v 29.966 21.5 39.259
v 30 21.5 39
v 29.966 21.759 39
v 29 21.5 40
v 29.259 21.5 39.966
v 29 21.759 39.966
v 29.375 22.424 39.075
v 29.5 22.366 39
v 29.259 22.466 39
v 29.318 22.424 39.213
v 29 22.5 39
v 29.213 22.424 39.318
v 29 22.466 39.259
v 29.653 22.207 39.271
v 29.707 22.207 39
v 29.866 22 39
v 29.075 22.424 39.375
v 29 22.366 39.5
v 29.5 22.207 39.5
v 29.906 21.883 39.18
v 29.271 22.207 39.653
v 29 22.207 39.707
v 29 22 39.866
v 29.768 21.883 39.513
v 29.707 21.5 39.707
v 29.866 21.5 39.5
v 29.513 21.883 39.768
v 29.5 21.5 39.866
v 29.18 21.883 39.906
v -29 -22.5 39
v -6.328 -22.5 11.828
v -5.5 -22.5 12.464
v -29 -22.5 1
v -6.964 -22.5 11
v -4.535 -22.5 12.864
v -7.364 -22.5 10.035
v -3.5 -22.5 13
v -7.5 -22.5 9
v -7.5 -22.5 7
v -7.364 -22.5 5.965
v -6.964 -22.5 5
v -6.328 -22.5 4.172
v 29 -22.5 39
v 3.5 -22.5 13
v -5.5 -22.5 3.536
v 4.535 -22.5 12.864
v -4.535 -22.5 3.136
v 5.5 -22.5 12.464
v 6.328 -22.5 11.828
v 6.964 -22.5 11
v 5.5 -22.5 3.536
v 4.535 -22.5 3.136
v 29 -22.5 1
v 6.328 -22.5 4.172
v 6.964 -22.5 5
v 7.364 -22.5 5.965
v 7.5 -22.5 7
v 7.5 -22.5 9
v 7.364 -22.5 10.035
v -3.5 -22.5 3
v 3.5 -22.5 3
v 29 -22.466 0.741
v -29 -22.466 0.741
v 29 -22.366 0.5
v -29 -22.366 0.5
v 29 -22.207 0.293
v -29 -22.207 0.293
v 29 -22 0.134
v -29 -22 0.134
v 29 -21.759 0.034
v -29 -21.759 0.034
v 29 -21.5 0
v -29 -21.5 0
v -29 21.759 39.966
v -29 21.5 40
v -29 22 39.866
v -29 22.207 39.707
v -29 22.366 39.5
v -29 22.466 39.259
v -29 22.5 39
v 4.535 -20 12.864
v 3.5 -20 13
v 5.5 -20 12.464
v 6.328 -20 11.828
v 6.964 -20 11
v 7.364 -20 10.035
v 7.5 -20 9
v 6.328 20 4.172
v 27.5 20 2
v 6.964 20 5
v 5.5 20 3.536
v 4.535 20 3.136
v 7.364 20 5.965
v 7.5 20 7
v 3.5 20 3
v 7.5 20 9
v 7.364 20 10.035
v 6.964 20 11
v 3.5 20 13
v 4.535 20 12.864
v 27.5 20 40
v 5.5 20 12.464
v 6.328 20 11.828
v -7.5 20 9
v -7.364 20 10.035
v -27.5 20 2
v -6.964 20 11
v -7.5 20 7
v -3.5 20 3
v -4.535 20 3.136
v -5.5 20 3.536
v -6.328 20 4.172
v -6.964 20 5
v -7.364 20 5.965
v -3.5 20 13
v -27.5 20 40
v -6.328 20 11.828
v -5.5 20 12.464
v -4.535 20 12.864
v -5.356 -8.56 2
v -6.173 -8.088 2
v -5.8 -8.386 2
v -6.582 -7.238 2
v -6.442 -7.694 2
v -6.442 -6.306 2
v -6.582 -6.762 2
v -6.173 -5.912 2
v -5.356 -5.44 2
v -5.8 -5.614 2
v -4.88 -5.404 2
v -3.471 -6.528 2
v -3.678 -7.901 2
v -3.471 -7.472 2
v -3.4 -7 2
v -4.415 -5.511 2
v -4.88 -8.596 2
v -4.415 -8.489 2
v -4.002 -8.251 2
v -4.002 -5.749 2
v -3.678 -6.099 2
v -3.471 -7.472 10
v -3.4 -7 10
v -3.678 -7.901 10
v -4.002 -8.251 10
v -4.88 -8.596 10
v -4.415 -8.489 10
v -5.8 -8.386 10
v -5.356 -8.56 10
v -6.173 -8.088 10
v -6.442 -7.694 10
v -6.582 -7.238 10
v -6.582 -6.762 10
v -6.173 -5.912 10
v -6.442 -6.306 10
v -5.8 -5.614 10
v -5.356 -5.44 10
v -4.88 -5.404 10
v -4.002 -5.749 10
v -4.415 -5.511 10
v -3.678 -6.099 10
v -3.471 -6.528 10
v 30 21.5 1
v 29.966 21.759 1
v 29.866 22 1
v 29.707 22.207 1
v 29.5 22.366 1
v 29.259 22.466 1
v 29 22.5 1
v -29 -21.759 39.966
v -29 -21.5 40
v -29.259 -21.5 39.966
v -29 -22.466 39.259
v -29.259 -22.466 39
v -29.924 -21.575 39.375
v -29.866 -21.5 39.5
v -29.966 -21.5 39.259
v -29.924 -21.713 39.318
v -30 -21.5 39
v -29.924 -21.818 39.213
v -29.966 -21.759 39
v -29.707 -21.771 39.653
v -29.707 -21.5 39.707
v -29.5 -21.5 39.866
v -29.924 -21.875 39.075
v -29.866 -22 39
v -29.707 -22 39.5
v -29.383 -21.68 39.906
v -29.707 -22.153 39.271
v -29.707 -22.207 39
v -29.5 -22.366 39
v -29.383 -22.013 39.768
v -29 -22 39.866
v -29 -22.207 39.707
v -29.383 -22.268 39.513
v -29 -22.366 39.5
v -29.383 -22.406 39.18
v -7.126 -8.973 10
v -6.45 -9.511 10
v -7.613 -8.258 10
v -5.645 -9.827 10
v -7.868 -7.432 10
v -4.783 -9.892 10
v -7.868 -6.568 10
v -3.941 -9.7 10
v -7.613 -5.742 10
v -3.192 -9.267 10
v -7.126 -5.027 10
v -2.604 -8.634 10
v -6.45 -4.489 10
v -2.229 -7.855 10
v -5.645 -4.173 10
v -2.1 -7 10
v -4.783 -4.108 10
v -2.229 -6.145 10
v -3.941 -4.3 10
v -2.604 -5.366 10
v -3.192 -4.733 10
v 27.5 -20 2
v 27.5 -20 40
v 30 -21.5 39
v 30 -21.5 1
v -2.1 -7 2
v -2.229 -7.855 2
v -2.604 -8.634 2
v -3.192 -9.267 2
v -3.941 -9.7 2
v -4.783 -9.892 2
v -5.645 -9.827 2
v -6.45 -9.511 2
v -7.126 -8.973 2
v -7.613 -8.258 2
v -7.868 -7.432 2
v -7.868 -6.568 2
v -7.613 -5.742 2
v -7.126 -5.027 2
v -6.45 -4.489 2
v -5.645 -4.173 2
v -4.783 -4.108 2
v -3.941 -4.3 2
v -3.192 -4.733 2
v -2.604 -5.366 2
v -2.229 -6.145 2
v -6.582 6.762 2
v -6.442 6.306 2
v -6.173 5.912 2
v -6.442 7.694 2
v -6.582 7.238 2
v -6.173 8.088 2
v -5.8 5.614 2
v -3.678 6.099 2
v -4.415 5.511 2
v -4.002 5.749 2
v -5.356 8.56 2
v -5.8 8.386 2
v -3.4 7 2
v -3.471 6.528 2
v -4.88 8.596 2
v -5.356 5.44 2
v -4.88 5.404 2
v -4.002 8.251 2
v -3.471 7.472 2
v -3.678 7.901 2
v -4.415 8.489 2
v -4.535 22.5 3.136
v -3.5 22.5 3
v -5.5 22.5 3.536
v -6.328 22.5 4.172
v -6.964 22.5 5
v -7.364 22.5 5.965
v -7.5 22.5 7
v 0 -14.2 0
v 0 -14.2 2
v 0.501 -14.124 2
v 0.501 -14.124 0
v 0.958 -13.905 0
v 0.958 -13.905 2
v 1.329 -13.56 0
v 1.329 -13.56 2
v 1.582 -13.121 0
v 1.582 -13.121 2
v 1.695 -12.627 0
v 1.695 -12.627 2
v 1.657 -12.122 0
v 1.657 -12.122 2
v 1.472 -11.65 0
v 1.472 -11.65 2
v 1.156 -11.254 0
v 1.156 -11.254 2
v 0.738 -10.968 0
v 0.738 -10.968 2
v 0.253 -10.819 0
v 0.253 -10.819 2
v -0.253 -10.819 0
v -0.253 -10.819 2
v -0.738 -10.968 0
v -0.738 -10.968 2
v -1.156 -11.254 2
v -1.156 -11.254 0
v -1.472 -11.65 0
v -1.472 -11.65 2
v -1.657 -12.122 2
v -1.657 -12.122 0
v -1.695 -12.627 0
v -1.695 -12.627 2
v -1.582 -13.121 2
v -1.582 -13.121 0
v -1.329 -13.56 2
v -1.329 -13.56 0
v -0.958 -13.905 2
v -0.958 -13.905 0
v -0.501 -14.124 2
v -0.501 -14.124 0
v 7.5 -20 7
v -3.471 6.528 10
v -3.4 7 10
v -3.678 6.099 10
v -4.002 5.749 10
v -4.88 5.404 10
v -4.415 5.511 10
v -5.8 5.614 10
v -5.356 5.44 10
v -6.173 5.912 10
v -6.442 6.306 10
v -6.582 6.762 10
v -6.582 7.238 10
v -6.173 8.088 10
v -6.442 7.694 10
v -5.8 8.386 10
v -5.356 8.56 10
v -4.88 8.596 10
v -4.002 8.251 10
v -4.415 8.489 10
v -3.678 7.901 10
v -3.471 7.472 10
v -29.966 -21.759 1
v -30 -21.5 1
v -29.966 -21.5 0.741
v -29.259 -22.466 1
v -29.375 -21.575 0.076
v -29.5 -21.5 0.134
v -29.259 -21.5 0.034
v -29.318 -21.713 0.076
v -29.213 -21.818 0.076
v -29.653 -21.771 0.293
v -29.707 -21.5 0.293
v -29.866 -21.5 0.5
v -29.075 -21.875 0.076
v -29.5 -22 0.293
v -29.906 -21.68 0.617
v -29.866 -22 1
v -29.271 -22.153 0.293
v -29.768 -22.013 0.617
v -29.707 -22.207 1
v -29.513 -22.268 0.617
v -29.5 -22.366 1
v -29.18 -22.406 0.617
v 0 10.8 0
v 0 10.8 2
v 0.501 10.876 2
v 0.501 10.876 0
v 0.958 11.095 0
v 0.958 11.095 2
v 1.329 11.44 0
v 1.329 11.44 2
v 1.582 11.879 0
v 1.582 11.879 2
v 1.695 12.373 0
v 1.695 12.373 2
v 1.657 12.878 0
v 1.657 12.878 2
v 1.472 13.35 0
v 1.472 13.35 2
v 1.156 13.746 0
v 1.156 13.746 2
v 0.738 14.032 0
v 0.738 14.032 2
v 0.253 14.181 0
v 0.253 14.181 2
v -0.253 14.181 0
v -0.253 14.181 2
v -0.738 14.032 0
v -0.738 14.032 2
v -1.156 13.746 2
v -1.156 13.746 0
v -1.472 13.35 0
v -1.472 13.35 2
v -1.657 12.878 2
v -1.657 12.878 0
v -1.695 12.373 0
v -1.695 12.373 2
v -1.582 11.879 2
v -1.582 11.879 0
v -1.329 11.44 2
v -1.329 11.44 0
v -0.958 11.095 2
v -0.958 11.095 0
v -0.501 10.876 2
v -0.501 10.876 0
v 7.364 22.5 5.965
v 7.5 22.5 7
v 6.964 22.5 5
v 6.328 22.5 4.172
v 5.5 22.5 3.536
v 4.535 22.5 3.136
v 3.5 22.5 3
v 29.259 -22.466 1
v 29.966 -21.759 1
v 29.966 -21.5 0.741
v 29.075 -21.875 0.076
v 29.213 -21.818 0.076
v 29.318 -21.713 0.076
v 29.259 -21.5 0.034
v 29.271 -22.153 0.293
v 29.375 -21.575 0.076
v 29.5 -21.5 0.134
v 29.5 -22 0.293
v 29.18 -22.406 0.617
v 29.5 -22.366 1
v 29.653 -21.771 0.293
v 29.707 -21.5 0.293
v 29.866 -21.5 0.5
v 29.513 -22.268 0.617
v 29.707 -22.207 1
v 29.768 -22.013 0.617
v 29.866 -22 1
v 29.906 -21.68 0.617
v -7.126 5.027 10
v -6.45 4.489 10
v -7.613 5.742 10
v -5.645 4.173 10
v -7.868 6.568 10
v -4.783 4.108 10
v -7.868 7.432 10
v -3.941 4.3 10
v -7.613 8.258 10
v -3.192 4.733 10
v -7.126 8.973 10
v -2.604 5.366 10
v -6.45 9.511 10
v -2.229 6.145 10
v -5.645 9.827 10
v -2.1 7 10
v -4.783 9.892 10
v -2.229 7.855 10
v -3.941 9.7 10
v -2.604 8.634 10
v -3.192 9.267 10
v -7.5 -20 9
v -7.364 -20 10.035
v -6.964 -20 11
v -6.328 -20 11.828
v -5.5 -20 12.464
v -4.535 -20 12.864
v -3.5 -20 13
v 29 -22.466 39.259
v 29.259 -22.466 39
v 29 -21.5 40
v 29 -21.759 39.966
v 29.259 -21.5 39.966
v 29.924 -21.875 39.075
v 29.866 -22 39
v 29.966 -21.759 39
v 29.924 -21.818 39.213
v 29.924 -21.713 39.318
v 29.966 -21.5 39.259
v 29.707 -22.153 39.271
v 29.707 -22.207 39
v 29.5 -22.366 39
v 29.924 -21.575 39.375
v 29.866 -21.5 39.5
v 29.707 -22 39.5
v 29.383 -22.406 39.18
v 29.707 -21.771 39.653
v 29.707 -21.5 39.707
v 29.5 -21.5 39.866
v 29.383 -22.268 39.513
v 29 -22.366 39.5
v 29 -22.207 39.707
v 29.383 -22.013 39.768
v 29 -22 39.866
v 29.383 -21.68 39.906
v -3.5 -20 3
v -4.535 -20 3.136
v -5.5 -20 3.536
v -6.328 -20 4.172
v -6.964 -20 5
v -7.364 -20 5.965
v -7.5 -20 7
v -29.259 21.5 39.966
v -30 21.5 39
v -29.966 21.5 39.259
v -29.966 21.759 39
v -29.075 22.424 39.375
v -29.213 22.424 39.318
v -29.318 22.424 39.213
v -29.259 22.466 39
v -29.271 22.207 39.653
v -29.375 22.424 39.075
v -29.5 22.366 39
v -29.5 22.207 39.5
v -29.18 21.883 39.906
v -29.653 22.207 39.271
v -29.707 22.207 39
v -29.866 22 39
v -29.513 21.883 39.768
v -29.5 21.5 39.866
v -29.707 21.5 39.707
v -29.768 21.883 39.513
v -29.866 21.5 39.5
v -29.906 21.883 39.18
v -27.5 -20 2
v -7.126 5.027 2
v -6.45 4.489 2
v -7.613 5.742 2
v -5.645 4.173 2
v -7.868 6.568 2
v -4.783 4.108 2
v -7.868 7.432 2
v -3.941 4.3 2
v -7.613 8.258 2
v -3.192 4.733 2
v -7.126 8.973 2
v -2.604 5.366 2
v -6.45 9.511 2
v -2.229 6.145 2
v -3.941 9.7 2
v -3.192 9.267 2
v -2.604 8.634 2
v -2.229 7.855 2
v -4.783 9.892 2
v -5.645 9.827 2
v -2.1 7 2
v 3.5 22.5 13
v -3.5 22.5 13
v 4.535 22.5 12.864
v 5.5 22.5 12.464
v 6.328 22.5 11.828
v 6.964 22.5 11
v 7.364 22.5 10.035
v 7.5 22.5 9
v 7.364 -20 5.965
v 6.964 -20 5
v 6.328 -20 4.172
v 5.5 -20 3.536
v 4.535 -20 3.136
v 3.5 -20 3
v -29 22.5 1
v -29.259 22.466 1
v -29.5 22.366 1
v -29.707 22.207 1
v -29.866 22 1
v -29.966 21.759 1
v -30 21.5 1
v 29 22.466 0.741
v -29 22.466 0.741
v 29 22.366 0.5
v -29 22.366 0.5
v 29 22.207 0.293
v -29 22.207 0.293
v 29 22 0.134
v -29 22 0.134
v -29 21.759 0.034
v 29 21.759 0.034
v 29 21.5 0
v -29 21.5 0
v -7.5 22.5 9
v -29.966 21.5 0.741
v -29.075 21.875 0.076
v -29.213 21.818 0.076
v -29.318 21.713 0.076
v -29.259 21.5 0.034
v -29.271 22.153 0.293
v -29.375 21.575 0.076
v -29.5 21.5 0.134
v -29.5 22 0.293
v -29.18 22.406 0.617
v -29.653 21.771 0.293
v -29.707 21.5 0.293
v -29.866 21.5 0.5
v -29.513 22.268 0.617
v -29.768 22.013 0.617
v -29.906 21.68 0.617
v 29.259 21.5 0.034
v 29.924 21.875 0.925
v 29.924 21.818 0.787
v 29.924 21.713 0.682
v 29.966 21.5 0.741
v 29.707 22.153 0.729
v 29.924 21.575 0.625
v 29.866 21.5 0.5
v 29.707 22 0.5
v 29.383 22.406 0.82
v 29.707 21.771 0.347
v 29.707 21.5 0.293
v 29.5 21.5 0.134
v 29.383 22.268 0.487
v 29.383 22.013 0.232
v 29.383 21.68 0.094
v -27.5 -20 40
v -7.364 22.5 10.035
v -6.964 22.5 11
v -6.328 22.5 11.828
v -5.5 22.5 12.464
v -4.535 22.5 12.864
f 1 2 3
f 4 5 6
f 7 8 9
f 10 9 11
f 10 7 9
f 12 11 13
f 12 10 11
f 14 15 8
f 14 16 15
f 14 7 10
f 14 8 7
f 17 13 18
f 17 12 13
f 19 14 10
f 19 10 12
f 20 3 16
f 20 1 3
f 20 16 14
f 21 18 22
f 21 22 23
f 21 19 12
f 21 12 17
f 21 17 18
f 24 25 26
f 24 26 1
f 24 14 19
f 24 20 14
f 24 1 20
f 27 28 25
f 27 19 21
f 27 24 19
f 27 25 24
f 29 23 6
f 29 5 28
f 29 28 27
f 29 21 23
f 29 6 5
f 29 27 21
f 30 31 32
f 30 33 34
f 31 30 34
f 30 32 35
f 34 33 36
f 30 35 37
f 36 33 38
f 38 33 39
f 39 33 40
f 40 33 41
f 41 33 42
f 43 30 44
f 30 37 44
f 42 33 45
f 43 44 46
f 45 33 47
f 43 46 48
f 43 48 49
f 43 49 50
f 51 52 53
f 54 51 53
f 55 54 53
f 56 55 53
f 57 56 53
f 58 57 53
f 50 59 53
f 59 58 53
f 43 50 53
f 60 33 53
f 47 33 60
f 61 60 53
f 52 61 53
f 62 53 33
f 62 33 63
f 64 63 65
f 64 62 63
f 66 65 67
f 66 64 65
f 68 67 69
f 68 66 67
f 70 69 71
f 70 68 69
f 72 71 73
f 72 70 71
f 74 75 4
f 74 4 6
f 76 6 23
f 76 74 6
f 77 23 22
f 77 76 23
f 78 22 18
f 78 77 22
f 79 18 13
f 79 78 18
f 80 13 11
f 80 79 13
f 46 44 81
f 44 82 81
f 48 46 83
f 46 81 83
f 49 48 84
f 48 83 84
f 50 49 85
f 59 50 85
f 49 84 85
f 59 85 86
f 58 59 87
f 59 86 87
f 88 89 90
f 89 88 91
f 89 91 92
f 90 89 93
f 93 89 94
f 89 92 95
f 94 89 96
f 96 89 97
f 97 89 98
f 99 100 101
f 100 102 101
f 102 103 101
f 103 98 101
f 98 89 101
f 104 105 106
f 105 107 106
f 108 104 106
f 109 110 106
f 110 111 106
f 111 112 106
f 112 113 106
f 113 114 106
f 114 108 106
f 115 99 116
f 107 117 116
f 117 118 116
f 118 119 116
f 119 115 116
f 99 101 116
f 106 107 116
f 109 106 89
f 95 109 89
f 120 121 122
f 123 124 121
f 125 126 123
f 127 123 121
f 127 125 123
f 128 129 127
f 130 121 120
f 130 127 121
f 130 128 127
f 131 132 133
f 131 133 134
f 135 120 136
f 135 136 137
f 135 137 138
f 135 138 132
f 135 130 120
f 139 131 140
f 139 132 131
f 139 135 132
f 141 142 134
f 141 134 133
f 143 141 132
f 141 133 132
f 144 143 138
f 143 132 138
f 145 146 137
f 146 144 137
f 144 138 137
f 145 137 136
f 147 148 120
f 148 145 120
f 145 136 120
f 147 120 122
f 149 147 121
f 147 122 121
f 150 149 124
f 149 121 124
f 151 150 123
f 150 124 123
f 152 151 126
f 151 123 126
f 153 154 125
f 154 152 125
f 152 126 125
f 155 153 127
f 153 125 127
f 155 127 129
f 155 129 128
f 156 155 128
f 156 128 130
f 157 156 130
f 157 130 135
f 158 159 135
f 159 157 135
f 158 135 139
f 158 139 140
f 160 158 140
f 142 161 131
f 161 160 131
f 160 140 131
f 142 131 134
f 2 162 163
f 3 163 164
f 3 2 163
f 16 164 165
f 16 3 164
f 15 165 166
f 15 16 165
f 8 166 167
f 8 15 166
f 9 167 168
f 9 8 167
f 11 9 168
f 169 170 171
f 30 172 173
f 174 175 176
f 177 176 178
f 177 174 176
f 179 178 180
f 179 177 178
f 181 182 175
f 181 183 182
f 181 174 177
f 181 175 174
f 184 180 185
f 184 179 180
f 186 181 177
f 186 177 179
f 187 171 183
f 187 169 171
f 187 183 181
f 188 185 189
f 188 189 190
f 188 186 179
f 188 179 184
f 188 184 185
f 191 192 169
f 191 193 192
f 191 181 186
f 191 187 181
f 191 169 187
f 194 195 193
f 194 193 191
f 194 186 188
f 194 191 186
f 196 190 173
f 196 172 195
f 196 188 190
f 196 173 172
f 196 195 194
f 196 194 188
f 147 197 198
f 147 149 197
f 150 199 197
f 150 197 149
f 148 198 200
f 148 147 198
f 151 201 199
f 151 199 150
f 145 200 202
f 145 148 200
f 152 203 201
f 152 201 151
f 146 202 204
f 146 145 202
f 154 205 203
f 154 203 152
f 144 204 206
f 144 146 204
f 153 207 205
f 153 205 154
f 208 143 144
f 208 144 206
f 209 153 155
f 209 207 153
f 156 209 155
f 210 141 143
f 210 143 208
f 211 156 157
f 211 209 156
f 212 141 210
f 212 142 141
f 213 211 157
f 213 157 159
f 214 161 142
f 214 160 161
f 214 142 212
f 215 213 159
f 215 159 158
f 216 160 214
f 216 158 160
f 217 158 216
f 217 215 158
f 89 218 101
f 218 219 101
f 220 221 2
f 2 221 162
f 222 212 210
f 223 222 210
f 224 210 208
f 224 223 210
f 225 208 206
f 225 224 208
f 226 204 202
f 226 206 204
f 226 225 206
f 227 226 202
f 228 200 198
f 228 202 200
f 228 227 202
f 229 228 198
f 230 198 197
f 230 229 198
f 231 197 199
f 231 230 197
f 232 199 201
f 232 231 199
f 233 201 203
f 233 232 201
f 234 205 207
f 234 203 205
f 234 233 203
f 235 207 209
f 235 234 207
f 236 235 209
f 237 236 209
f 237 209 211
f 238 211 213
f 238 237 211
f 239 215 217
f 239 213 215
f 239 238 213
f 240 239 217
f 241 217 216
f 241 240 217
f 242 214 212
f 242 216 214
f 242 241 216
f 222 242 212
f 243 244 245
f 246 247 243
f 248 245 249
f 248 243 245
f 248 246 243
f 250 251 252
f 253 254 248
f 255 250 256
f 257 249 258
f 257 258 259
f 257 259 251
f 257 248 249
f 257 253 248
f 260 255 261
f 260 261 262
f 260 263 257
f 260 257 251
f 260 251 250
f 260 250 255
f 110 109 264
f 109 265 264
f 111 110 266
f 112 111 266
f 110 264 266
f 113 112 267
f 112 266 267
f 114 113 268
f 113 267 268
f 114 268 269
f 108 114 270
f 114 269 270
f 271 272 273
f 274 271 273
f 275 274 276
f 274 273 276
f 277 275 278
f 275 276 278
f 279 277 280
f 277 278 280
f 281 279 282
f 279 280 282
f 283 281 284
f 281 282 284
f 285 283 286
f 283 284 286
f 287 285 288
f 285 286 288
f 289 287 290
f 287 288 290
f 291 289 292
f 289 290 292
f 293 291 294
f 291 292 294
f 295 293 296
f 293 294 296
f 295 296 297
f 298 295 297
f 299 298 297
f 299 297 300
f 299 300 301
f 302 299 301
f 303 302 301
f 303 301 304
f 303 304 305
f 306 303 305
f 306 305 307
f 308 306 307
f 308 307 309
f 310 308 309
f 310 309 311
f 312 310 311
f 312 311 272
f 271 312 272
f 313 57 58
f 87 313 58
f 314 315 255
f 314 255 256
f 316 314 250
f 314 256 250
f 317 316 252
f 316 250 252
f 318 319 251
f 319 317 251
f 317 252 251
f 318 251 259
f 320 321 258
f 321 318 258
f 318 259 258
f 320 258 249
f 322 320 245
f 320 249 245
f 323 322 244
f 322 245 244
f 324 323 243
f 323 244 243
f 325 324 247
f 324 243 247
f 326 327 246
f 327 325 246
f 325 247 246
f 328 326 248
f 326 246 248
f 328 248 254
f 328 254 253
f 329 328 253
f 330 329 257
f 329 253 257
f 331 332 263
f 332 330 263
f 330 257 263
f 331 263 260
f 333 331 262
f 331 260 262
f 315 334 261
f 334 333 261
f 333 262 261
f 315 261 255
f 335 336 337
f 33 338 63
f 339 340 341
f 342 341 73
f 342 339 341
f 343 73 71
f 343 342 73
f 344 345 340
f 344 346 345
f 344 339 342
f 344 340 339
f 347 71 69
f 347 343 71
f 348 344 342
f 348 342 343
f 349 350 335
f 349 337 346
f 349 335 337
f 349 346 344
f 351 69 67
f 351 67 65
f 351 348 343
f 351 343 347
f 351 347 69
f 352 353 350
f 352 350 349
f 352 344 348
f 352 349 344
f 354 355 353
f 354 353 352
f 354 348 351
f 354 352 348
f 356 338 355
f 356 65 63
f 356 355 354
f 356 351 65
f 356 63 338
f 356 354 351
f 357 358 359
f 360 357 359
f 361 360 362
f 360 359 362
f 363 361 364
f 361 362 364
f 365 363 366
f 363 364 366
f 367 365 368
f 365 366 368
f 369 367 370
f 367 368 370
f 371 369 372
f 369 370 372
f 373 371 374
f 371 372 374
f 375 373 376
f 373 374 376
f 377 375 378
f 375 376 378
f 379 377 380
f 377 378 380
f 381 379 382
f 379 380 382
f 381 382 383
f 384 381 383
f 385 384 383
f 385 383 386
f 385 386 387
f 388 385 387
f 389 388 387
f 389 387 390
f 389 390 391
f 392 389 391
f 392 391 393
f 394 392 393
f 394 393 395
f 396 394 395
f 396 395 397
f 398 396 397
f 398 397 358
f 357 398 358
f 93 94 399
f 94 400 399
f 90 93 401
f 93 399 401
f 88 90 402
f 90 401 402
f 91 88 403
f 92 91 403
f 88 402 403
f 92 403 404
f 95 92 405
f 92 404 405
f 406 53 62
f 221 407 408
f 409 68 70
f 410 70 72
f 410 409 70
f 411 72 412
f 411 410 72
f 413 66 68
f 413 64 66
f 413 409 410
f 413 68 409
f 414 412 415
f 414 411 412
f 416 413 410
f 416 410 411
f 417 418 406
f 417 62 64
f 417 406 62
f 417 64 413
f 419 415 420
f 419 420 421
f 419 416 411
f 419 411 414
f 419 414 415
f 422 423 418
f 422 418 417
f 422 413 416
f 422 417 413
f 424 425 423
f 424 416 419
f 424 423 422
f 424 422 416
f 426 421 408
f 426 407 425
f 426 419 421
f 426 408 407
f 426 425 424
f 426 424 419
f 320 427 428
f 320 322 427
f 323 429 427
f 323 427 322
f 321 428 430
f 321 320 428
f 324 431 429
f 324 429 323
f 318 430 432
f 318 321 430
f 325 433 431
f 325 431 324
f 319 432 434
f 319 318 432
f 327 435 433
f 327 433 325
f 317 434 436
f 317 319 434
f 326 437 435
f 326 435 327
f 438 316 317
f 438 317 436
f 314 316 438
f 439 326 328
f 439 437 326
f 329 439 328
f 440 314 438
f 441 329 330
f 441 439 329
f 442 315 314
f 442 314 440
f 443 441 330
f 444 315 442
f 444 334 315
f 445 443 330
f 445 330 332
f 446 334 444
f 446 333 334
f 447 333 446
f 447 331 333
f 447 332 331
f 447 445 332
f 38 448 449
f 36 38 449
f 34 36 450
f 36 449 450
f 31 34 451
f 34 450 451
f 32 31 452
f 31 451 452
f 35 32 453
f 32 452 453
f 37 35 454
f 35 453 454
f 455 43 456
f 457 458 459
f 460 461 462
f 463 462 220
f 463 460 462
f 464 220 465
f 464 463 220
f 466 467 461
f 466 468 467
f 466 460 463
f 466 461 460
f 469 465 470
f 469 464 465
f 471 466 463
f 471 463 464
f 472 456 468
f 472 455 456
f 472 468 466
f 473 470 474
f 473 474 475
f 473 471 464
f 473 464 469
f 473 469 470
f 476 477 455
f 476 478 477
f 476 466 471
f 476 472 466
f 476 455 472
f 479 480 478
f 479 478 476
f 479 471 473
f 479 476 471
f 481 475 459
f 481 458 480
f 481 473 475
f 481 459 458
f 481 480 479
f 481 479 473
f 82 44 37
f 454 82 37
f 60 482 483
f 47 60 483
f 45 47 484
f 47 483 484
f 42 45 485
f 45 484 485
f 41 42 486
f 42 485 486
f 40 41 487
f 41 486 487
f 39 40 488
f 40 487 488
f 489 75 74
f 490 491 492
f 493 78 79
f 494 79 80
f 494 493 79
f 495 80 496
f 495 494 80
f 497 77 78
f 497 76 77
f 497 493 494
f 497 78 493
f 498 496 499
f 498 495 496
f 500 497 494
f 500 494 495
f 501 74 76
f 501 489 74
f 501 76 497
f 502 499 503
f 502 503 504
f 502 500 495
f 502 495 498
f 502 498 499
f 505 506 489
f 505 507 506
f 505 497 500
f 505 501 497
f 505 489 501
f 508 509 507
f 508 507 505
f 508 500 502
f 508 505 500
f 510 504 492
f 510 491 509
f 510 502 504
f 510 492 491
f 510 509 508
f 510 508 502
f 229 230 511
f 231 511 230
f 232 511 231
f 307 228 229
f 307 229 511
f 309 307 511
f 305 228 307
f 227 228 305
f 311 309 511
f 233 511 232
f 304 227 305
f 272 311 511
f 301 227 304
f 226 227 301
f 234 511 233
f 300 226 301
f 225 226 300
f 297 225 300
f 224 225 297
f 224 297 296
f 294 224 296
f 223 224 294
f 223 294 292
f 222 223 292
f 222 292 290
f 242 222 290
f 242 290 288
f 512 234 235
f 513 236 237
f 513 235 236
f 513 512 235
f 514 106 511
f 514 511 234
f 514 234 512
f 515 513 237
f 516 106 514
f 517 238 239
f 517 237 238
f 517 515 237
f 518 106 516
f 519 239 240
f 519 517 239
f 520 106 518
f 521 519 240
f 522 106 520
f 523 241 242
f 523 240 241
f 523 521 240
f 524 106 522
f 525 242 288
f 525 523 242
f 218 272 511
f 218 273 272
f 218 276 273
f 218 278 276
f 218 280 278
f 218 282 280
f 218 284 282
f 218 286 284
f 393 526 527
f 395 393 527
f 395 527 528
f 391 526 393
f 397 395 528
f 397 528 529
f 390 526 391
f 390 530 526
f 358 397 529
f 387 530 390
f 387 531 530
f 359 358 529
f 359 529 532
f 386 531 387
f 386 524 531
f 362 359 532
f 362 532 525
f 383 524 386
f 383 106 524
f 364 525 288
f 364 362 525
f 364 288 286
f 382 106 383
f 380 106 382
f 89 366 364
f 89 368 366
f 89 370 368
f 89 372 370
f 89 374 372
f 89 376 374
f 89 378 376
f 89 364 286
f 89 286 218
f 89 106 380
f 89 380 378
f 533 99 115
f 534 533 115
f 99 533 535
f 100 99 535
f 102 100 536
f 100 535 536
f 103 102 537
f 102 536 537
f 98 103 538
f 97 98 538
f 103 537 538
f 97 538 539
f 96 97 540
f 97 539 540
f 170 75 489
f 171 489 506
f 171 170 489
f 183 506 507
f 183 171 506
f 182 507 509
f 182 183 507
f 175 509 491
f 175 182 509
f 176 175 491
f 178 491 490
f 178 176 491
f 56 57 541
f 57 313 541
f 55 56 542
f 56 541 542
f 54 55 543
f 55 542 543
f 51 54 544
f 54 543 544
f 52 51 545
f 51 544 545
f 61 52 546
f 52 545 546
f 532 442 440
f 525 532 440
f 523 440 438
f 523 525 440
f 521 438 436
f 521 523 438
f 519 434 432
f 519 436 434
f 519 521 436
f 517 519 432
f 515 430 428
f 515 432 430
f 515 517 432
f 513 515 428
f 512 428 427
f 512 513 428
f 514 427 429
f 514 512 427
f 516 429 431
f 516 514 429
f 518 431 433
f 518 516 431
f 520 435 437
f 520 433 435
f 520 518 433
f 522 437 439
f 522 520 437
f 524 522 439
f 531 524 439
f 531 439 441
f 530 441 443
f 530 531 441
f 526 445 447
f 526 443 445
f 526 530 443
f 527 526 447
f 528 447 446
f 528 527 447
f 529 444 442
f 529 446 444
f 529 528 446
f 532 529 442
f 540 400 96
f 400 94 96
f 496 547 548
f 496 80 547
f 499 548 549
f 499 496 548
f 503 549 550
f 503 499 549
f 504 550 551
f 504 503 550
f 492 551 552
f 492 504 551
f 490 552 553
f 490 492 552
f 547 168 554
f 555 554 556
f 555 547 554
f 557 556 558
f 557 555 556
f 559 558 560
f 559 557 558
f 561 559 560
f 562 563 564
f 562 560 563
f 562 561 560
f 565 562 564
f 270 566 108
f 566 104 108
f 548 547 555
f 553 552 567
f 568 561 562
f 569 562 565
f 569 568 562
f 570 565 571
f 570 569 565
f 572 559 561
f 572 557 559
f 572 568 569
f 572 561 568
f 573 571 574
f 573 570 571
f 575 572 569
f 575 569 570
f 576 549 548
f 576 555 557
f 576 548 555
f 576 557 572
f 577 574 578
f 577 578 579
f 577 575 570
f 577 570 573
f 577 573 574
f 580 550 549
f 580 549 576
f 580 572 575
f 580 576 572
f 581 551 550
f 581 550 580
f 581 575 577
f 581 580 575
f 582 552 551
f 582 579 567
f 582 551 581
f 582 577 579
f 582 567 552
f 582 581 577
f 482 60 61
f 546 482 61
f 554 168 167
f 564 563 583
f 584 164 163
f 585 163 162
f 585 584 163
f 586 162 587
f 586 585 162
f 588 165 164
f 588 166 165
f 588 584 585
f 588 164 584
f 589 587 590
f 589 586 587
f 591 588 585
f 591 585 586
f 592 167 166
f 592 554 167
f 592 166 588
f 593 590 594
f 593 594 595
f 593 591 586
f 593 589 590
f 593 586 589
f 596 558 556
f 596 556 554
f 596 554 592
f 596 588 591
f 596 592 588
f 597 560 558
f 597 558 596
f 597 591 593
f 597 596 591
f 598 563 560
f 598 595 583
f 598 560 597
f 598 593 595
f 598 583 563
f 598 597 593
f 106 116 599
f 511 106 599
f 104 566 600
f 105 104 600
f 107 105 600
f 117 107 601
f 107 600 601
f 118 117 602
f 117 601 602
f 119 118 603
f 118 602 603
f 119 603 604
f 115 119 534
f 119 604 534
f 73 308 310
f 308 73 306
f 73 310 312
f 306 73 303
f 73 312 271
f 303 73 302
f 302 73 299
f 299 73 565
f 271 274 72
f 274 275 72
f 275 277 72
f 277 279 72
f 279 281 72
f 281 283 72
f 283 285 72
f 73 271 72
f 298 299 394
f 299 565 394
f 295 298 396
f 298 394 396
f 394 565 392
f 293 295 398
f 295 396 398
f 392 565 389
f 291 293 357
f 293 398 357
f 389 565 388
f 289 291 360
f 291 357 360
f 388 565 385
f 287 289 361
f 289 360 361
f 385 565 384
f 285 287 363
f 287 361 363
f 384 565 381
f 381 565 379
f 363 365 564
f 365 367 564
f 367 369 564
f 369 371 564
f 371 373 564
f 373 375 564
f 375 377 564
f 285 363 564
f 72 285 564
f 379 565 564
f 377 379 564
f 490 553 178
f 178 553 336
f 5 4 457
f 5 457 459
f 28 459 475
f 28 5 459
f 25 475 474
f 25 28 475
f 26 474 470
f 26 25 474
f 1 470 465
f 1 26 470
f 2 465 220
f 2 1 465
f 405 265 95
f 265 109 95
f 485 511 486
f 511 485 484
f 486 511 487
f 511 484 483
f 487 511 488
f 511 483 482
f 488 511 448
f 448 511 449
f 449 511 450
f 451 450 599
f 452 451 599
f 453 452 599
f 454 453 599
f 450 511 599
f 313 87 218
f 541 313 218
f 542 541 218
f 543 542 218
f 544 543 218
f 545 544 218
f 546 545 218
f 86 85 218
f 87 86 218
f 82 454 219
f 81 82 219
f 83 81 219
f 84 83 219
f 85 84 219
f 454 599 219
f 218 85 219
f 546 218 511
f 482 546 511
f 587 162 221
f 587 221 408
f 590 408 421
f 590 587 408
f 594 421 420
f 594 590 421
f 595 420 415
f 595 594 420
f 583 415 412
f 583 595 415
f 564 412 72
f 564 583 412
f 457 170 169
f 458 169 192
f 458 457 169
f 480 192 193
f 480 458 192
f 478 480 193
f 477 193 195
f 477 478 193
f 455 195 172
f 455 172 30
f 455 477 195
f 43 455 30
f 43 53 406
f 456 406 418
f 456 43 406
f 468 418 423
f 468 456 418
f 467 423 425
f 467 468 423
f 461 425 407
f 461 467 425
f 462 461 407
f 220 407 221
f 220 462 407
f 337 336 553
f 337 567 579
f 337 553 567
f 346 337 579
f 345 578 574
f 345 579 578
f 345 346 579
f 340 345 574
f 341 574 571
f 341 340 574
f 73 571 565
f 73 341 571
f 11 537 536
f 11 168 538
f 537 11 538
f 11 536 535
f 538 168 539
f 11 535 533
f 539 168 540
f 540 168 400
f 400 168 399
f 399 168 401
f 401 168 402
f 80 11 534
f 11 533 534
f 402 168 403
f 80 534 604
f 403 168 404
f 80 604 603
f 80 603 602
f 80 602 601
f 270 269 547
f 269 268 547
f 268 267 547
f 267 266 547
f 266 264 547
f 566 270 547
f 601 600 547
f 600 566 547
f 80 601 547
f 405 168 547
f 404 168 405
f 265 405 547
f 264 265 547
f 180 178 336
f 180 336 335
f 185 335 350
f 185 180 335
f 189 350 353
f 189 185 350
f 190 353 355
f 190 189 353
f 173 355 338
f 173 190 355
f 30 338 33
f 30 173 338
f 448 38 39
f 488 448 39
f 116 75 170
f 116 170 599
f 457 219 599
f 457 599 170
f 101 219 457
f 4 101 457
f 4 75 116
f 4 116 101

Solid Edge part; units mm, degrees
sketch "Sketch1" plane through (0, 0, 0) normal (0, 0, 1) x (1, 0, 0)
  line L0 (30, 22.5) -> (-30, 22.5)
  line L1 (-30, 22.5) -> (-30, -22.5)
  line L2 (-30, -22.5) -> (30, -22.5)
  line L3 (30, -22.5) -> (30, 22.5)
extrude "Protrusion1" add sketch "Sketch1" along normal blind 40
sketch "Sketch2" plane through (0, -22.5, 12.5) normal (0, -1, 0) x (1, 0, 0)
  line L0 (7.5, 0.5) -> (-7.5, 0.5)
  line L1 (-7.5, 0.5) -> (-7.5, -9.5)
  line L2 (-7.5, -9.5) -> (7.5, -9.5)
  line L3 (7.5, -9.5) -> (7.5, 0.5)
  dimension "D1" = 3
  dimension "D2" = 10
  dimension "D3" = 15
extrude "ExtrudedCutout_1" cut sketch "Sketch2" against normal blind 70.2135
fillet "Verrundung_2" radius 4 4 edges at (7.5, 0, 13) (-7.5, 0, 13) (-7.5, 0, 3) (7.5, 0, 3)
sketch "Sketch3" plane through (0, 0, 40) normal (0, 0, 1) x (1, 0, 0)
  circle A0 centre (-18, 0) radius 6
  dimension "D1" = 12
extrude "ExtrudedCutout_3" cut sketch "Sketch3" against normal blind 20.7766
fillet "Round_3" radius 1 12 edges at (0, -22.5, 40) (-30, 0, 40) (-30, -22.5, 20) (30, -22.5, 20) (30, 0, 40) (0, 22.5, 40) (-30, 22.5, 20) (0, 22.5, 0) (-30, 0, 0) (0, -22.5, 0) (30, 0, 0) (30, 22.5, 20)
sketch "Sketch4" plane through (0, 0, 40) normal (0, 0, 1) x (1, 0, 0)
  line L0 (-27.5, -20) -> (27.5, -20)
  line L1 (27.5, -20) -> (27.5, 20)
  line L2 (27.5, 20) -> (-27.5, 20)
  line L3 (-27.5, 20) -> (-27.5, -20)
  dimension "D1" = 2.5
  dimension "D2" = 2.5
  dimension "D3" = 2.5
extrude "ExtrudedCutout_5" cut sketch "Sketch4" against normal blind 38
hole "Hole1" at (0, 12.5, 21) direction (0, 0, -1) diameter 3.4 end up to next
hole "Hole2" at (0, -12.5, 21) direction (0, 0, -1) diameter 3.4 end up to next
sketch "Sketch5" plane through (0, 0, 2) normal (0, 0, 1) x (1, 0, 0)
  circle A0 centre (-5, 7) radius 1.6
  circle A1 centre (-5, 7) radius 2.9
  circle A2 centre (-5, -7) radius 1.6
  circle A3 centre (-5, -7) radius 2.9
  dimension "D1" = 16.5
  dimension "D2" = 5
extrude "Protrusion2" add sketch "Sketch5" along normal blind 8
